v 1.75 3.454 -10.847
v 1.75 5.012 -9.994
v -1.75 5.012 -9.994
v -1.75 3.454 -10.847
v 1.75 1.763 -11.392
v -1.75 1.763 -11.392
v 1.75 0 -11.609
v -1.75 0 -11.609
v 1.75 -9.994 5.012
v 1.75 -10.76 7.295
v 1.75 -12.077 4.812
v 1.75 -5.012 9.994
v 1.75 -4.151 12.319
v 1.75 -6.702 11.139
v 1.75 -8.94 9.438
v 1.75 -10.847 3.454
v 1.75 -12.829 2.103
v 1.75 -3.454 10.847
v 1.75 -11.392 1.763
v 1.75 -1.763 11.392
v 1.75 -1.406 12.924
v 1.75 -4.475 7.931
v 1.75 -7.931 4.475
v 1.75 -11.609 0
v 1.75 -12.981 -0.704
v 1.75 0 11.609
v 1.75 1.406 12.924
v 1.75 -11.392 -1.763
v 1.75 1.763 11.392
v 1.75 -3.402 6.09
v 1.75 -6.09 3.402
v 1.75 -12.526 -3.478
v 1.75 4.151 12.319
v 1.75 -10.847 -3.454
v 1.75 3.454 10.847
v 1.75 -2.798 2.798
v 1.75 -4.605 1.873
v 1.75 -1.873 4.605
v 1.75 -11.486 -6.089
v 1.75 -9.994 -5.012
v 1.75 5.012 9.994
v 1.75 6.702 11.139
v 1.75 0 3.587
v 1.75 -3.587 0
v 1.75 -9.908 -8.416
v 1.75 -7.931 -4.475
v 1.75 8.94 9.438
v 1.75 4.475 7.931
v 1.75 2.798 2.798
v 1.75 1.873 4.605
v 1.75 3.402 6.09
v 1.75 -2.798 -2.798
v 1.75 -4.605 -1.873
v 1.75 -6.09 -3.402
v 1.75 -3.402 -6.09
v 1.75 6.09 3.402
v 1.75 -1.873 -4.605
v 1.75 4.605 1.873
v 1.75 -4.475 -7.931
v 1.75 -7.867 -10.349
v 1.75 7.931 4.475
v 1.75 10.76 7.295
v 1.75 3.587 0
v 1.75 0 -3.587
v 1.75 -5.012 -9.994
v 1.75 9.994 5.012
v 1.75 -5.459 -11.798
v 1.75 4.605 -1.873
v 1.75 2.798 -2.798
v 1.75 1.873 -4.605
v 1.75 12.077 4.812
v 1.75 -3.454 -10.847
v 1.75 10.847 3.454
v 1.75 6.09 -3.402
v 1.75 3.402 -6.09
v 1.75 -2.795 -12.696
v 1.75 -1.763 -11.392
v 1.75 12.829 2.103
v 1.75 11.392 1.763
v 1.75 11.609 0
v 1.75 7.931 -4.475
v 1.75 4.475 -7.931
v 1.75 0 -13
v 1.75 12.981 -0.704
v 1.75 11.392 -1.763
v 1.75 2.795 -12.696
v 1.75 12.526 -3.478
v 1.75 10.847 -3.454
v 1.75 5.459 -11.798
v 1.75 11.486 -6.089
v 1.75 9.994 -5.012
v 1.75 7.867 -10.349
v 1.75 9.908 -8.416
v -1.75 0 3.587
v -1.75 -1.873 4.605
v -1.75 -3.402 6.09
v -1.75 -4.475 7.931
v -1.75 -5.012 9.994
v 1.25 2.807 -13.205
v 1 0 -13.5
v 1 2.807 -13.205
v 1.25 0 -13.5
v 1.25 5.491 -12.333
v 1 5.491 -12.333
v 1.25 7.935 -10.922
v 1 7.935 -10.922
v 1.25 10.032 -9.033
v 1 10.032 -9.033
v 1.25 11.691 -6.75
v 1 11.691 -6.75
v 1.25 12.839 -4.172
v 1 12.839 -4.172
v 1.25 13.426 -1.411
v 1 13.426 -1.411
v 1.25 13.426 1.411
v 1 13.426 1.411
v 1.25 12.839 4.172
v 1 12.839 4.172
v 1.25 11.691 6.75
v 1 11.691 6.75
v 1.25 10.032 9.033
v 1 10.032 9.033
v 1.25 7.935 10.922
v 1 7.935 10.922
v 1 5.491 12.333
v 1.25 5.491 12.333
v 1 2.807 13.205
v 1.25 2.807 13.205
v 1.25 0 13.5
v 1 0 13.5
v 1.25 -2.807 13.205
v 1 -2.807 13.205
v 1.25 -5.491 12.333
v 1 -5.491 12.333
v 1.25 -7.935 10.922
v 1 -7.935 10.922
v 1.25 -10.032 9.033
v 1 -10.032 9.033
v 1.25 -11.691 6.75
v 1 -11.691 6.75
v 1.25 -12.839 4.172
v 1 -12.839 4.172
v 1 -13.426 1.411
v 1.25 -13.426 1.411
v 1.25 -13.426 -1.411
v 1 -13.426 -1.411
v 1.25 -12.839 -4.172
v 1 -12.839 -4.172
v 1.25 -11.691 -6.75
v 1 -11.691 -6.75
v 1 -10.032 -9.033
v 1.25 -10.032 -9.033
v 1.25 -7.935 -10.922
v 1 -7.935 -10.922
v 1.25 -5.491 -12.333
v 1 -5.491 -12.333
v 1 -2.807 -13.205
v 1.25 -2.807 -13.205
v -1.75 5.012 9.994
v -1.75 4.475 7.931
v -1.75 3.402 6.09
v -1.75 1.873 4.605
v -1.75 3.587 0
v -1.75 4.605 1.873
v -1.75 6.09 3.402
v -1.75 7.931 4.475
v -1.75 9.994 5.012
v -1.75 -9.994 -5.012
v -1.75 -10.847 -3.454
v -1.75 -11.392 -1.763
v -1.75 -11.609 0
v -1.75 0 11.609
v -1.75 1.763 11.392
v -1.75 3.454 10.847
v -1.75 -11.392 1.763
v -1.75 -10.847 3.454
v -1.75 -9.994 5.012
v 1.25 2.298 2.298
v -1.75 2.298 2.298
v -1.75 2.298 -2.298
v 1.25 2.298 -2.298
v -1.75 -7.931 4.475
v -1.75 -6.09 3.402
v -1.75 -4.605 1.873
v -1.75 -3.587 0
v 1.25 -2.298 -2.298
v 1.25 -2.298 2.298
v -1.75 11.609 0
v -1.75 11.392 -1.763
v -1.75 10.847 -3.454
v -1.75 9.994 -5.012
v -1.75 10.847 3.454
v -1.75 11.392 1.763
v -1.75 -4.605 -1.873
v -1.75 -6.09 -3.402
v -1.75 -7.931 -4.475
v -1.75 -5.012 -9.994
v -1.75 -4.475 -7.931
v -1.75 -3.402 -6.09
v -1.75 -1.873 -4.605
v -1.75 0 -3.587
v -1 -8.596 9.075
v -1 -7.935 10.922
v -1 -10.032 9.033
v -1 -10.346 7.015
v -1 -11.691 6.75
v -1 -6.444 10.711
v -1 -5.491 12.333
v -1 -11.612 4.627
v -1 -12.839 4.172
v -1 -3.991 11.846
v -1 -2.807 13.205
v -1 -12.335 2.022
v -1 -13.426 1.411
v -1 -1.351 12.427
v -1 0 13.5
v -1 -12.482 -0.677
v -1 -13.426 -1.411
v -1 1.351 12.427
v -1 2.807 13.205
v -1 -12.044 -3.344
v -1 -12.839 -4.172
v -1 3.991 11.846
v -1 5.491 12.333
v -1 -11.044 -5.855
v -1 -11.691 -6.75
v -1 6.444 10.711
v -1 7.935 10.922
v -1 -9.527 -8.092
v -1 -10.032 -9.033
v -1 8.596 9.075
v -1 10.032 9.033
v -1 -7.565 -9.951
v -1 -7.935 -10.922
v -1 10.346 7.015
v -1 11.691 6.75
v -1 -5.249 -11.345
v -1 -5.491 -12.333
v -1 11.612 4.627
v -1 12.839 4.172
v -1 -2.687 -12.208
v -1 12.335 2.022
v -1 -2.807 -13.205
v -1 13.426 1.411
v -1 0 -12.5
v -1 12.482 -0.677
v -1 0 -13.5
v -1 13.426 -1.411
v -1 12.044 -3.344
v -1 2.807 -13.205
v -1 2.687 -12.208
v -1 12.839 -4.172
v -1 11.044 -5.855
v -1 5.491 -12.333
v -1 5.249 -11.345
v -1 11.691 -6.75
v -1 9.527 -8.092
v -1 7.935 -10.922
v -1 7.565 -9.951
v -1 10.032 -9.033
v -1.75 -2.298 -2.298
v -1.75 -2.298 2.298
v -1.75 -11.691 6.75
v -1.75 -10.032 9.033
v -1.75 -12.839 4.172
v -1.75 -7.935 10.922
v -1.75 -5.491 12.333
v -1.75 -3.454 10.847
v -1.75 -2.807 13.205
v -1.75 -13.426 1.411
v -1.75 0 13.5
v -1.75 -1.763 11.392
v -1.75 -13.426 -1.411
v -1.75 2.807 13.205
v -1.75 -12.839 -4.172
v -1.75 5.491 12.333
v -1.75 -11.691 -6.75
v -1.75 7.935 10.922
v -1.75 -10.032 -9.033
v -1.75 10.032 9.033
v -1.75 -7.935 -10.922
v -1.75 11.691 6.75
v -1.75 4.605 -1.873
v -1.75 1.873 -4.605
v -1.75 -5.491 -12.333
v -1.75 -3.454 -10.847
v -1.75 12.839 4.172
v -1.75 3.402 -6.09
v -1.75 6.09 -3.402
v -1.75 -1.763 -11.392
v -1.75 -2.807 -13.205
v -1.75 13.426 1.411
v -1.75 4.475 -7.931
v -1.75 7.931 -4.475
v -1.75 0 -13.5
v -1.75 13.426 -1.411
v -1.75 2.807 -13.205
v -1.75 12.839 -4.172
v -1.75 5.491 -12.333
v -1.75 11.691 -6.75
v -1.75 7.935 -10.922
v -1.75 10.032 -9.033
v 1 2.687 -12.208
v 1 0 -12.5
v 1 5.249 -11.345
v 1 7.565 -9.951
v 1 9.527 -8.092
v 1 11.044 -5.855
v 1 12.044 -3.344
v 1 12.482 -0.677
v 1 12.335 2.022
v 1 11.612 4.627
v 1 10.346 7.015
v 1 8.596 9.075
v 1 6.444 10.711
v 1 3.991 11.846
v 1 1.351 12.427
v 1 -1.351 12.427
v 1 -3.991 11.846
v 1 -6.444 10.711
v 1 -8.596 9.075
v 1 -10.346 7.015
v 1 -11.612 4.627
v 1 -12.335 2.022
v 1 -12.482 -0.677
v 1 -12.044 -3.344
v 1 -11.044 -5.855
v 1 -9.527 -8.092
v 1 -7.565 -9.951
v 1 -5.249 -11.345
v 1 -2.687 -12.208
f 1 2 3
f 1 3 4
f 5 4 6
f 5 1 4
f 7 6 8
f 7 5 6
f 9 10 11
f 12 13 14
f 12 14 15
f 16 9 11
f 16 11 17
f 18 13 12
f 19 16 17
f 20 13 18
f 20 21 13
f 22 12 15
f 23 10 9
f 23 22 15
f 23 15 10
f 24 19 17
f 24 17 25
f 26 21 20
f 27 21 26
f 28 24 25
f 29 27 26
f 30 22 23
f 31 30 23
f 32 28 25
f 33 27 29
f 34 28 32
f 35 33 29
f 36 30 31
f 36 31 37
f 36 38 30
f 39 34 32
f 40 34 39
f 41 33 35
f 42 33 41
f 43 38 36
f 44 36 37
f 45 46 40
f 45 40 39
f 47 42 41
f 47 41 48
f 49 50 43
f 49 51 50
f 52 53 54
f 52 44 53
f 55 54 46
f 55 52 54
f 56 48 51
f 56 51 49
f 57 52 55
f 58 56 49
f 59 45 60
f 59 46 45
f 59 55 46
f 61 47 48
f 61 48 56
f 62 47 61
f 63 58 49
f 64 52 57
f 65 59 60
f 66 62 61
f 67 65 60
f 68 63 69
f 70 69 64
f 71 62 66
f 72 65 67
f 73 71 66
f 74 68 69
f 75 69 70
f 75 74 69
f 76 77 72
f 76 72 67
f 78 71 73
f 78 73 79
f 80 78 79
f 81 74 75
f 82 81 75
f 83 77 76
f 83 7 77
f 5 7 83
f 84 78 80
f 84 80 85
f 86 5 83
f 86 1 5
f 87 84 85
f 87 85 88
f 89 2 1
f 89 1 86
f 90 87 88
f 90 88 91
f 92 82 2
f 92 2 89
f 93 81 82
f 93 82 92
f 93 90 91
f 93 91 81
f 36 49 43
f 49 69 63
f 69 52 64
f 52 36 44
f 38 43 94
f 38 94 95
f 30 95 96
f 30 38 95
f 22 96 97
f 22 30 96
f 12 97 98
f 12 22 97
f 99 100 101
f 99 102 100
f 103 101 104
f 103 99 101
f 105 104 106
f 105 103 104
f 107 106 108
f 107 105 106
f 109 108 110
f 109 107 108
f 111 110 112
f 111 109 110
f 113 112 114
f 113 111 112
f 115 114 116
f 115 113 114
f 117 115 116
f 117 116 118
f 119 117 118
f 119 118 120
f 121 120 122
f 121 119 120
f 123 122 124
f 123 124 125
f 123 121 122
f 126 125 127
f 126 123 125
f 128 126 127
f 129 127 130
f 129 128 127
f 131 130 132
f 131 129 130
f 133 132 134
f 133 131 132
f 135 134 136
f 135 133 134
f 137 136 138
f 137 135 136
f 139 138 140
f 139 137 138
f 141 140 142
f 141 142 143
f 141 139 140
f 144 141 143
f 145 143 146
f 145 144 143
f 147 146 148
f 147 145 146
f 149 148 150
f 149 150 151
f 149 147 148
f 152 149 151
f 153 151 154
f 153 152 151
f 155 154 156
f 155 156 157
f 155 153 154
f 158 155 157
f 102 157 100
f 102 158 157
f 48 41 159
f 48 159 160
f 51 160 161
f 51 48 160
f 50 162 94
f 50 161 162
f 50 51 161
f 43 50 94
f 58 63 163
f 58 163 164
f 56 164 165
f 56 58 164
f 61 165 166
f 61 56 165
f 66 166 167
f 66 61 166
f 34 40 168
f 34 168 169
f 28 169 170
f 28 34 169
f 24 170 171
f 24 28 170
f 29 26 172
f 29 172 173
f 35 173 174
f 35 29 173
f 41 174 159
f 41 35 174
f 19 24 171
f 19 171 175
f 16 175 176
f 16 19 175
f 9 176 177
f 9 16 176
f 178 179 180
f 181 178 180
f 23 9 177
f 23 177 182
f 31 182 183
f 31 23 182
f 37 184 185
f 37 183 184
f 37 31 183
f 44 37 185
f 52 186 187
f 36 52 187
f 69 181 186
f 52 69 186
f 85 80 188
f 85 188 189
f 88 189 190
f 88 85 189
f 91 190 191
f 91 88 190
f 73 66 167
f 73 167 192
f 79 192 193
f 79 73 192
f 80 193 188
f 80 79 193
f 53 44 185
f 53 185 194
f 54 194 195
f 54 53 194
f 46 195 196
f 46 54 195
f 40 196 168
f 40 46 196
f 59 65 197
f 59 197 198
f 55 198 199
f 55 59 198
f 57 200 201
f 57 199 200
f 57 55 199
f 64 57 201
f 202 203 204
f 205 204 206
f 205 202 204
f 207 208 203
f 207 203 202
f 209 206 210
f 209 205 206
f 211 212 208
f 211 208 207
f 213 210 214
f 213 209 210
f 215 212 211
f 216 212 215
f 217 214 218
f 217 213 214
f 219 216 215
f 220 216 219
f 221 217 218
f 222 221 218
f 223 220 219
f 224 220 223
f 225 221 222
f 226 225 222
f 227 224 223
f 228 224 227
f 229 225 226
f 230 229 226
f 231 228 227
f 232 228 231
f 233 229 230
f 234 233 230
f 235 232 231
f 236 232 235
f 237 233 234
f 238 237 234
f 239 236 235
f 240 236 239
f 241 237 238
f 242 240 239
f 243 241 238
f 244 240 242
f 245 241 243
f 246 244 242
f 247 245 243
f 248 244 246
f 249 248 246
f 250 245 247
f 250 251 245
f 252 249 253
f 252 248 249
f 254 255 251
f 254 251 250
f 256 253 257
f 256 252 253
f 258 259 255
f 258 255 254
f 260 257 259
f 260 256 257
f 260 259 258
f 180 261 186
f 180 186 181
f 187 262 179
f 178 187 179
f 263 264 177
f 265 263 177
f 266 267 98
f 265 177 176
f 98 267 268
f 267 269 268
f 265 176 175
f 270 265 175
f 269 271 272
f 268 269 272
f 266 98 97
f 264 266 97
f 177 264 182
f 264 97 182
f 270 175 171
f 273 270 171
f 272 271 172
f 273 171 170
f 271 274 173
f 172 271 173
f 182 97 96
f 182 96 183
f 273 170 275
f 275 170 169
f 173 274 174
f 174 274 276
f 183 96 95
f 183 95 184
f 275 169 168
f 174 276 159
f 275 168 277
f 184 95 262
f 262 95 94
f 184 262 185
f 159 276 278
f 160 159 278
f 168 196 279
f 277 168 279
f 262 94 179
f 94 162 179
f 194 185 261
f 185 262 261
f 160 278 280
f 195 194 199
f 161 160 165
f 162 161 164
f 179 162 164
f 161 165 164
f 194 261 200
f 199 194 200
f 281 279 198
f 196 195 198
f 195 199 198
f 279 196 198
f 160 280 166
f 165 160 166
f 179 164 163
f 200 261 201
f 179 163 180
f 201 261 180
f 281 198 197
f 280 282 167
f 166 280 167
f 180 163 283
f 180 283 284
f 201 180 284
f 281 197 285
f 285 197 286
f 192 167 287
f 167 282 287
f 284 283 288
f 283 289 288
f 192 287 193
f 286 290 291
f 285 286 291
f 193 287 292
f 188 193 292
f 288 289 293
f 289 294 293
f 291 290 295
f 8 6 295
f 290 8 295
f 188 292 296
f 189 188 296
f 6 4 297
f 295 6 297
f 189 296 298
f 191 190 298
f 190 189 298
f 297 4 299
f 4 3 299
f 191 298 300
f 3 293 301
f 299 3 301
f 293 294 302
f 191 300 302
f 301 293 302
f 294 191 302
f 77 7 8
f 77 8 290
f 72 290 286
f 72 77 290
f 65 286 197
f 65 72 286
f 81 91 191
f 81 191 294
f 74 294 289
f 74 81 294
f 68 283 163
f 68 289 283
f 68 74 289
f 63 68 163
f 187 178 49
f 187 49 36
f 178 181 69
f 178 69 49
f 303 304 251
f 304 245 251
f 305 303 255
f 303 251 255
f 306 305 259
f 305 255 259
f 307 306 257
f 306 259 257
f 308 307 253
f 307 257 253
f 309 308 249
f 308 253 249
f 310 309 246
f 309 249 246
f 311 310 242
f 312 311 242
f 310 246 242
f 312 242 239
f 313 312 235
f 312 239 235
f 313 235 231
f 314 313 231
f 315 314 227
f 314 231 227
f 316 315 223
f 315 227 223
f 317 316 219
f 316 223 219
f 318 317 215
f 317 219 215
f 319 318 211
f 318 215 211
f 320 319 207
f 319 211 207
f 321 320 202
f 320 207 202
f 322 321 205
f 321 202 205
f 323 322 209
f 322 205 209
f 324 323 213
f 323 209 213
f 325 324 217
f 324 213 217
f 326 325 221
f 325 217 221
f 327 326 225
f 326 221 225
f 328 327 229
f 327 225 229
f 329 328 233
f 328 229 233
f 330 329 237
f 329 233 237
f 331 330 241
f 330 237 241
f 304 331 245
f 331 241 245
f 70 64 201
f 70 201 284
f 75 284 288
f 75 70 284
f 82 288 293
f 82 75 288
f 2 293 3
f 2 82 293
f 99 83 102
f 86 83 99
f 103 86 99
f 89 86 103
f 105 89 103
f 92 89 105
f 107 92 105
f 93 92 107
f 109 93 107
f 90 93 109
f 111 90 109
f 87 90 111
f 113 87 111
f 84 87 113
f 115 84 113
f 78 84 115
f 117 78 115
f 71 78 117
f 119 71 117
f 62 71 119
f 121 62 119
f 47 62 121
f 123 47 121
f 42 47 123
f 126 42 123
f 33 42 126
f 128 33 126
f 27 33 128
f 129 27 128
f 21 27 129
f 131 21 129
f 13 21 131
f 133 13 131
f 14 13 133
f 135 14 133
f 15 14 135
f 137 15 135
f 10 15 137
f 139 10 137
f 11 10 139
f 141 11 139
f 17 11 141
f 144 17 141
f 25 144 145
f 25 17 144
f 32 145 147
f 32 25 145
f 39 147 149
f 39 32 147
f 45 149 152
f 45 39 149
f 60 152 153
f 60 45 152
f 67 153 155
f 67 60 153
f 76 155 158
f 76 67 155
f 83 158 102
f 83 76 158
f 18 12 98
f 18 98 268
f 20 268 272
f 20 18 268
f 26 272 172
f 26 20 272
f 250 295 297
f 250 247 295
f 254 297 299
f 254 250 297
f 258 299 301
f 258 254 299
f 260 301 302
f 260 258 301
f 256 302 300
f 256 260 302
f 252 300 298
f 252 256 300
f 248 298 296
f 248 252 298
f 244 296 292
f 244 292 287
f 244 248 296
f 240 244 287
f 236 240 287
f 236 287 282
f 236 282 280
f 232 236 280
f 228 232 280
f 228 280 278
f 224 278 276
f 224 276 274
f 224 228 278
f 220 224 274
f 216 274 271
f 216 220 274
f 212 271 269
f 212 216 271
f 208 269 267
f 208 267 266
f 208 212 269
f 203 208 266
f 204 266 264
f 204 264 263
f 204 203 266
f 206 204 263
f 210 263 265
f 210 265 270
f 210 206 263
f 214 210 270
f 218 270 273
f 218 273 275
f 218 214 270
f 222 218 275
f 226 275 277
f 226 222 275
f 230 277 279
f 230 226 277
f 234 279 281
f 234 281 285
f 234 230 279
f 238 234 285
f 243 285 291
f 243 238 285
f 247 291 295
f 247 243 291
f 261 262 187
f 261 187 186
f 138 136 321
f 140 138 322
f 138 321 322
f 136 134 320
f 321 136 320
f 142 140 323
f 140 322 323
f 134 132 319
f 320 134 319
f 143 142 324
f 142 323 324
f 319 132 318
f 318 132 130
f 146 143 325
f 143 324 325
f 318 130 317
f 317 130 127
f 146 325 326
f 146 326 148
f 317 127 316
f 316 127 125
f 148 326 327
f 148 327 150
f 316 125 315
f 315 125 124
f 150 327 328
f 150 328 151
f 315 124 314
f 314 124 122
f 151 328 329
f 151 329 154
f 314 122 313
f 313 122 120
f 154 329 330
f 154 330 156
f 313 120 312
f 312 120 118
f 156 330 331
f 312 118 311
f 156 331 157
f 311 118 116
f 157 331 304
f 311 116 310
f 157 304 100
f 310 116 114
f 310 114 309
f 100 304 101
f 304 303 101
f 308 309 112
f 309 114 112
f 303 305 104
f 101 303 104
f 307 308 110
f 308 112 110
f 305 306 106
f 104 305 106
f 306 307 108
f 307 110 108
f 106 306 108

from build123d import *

# Parameters (mm, degrees)
SKETCH1_R               = 13.5
BOSS_EXTRUDE1_DEPTH     = 1.75
CUT_EXTRUDE1_DEPTH      = 20.17191957
CIRPATTERN1_COUNT       = 4
CUT_EXTRUDE2_DEPTH      = 20.17191957
CUT_EXTRUDE2_DEPTH_BACK = 20.17191957
SKETCH3_W               = 4.596194078
SKETCH3_H               = 4.596194078
CHAMFER1_SIZE           = 0.5
SKETCH4_R               = 13.5
SKETCH4_R_2             = 12.5
CUT_EXTRUDE3_DEPTH      = 1


with BuildPart() as part:
    # Sketch1 → Boss-Extrude1 (new, symmetric)
    with BuildSketch(Plane(origin=(0, 0, 0), x_dir=(0, 0, -1), z_dir=(1, 0, 0))):
        Circle(SKETCH1_R)
    extrude(amount=BOSS_EXTRUDE1_DEPTH, both=True)

    # Sketch2 → Cut-Extrude1 (cut, symmetric)
    with BuildSketch(Plane(origin=(0, 0, 0), x_dir=(0, 0, -1), z_dir=(1, 0, 0))):
        with BuildLine():
            ThreePointArc((0, 3.587478321), (-3.402339743, 6.089548883), (-5.012219469, 9.99397715))
            ThreePointArc((-5.012219469, 9.99397715), (-2.621563936, 11.159720287), (0, 11.6087119))
            ThreePointArc((0, 11.6087119), (2.621563936, 11.159720287), (5.012219469, 9.99397715))
            ThreePointArc((5.012219469, 9.99397715), (3.402339743, 6.089548883), (0, 3.587478321))
        make_face()
    cut_extrude1 = extrude(amount=CUT_EXTRUDE1_DEPTH, both=True, mode=Mode.SUBTRACT)

    # CirPattern1: Cut-Extrude1 ×4 about axis
    cirpattern1_axis = Axis((0, 0, 0), (1, 0, 0))
    for i in range(1, CIRPATTERN1_COUNT):
        add(cut_extrude1.rotate(cirpattern1_axis, i * 360 / CIRPATTERN1_COUNT), mode=Mode.SUBTRACT)

    # Sketch3 → Cut-Extrude2 (cut, two sides: drawn at the far end of the back side and taken through both)
    with BuildSketch(Plane(origin=(0, 0, 0), x_dir=(0, 0, -1), z_dir=(1, 0, 0)).offset(-CUT_EXTRUDE2_DEPTH_BACK)):
        Rectangle(SKETCH3_W, SKETCH3_H)
    extrude(amount=CUT_EXTRUDE2_DEPTH + CUT_EXTRUDE2_DEPTH_BACK, mode=Mode.SUBTRACT)

    # Chamfer1
    chamfer1_edges = [part.edges().sort_by_distance(p)[0] for p in [
        (1.75, 0, 13.5),
        (1.75, 0, 2.298097039),
        (1.75, -2.298097039, 0),
        (1.75, 0, -2.298097039),
        (1.75, 2.298097039, 0),
    ]]
    chamfer(chamfer1_edges, length=CHAMFER1_SIZE)

    # Sketch4 → Cut-Extrude3 (cut, symmetric)
    with BuildSketch(Plane(origin=(0, 0, 0), x_dir=(0, 0, -1), z_dir=(1, 0, 0))):
        Circle(SKETCH4_R)
        Circle(SKETCH4_R_2, mode=Mode.SUBTRACT)
    extrude(amount=CUT_EXTRUDE3_DEPTH, both=True, mode=Mode.SUBTRACT)


solid = part.part
